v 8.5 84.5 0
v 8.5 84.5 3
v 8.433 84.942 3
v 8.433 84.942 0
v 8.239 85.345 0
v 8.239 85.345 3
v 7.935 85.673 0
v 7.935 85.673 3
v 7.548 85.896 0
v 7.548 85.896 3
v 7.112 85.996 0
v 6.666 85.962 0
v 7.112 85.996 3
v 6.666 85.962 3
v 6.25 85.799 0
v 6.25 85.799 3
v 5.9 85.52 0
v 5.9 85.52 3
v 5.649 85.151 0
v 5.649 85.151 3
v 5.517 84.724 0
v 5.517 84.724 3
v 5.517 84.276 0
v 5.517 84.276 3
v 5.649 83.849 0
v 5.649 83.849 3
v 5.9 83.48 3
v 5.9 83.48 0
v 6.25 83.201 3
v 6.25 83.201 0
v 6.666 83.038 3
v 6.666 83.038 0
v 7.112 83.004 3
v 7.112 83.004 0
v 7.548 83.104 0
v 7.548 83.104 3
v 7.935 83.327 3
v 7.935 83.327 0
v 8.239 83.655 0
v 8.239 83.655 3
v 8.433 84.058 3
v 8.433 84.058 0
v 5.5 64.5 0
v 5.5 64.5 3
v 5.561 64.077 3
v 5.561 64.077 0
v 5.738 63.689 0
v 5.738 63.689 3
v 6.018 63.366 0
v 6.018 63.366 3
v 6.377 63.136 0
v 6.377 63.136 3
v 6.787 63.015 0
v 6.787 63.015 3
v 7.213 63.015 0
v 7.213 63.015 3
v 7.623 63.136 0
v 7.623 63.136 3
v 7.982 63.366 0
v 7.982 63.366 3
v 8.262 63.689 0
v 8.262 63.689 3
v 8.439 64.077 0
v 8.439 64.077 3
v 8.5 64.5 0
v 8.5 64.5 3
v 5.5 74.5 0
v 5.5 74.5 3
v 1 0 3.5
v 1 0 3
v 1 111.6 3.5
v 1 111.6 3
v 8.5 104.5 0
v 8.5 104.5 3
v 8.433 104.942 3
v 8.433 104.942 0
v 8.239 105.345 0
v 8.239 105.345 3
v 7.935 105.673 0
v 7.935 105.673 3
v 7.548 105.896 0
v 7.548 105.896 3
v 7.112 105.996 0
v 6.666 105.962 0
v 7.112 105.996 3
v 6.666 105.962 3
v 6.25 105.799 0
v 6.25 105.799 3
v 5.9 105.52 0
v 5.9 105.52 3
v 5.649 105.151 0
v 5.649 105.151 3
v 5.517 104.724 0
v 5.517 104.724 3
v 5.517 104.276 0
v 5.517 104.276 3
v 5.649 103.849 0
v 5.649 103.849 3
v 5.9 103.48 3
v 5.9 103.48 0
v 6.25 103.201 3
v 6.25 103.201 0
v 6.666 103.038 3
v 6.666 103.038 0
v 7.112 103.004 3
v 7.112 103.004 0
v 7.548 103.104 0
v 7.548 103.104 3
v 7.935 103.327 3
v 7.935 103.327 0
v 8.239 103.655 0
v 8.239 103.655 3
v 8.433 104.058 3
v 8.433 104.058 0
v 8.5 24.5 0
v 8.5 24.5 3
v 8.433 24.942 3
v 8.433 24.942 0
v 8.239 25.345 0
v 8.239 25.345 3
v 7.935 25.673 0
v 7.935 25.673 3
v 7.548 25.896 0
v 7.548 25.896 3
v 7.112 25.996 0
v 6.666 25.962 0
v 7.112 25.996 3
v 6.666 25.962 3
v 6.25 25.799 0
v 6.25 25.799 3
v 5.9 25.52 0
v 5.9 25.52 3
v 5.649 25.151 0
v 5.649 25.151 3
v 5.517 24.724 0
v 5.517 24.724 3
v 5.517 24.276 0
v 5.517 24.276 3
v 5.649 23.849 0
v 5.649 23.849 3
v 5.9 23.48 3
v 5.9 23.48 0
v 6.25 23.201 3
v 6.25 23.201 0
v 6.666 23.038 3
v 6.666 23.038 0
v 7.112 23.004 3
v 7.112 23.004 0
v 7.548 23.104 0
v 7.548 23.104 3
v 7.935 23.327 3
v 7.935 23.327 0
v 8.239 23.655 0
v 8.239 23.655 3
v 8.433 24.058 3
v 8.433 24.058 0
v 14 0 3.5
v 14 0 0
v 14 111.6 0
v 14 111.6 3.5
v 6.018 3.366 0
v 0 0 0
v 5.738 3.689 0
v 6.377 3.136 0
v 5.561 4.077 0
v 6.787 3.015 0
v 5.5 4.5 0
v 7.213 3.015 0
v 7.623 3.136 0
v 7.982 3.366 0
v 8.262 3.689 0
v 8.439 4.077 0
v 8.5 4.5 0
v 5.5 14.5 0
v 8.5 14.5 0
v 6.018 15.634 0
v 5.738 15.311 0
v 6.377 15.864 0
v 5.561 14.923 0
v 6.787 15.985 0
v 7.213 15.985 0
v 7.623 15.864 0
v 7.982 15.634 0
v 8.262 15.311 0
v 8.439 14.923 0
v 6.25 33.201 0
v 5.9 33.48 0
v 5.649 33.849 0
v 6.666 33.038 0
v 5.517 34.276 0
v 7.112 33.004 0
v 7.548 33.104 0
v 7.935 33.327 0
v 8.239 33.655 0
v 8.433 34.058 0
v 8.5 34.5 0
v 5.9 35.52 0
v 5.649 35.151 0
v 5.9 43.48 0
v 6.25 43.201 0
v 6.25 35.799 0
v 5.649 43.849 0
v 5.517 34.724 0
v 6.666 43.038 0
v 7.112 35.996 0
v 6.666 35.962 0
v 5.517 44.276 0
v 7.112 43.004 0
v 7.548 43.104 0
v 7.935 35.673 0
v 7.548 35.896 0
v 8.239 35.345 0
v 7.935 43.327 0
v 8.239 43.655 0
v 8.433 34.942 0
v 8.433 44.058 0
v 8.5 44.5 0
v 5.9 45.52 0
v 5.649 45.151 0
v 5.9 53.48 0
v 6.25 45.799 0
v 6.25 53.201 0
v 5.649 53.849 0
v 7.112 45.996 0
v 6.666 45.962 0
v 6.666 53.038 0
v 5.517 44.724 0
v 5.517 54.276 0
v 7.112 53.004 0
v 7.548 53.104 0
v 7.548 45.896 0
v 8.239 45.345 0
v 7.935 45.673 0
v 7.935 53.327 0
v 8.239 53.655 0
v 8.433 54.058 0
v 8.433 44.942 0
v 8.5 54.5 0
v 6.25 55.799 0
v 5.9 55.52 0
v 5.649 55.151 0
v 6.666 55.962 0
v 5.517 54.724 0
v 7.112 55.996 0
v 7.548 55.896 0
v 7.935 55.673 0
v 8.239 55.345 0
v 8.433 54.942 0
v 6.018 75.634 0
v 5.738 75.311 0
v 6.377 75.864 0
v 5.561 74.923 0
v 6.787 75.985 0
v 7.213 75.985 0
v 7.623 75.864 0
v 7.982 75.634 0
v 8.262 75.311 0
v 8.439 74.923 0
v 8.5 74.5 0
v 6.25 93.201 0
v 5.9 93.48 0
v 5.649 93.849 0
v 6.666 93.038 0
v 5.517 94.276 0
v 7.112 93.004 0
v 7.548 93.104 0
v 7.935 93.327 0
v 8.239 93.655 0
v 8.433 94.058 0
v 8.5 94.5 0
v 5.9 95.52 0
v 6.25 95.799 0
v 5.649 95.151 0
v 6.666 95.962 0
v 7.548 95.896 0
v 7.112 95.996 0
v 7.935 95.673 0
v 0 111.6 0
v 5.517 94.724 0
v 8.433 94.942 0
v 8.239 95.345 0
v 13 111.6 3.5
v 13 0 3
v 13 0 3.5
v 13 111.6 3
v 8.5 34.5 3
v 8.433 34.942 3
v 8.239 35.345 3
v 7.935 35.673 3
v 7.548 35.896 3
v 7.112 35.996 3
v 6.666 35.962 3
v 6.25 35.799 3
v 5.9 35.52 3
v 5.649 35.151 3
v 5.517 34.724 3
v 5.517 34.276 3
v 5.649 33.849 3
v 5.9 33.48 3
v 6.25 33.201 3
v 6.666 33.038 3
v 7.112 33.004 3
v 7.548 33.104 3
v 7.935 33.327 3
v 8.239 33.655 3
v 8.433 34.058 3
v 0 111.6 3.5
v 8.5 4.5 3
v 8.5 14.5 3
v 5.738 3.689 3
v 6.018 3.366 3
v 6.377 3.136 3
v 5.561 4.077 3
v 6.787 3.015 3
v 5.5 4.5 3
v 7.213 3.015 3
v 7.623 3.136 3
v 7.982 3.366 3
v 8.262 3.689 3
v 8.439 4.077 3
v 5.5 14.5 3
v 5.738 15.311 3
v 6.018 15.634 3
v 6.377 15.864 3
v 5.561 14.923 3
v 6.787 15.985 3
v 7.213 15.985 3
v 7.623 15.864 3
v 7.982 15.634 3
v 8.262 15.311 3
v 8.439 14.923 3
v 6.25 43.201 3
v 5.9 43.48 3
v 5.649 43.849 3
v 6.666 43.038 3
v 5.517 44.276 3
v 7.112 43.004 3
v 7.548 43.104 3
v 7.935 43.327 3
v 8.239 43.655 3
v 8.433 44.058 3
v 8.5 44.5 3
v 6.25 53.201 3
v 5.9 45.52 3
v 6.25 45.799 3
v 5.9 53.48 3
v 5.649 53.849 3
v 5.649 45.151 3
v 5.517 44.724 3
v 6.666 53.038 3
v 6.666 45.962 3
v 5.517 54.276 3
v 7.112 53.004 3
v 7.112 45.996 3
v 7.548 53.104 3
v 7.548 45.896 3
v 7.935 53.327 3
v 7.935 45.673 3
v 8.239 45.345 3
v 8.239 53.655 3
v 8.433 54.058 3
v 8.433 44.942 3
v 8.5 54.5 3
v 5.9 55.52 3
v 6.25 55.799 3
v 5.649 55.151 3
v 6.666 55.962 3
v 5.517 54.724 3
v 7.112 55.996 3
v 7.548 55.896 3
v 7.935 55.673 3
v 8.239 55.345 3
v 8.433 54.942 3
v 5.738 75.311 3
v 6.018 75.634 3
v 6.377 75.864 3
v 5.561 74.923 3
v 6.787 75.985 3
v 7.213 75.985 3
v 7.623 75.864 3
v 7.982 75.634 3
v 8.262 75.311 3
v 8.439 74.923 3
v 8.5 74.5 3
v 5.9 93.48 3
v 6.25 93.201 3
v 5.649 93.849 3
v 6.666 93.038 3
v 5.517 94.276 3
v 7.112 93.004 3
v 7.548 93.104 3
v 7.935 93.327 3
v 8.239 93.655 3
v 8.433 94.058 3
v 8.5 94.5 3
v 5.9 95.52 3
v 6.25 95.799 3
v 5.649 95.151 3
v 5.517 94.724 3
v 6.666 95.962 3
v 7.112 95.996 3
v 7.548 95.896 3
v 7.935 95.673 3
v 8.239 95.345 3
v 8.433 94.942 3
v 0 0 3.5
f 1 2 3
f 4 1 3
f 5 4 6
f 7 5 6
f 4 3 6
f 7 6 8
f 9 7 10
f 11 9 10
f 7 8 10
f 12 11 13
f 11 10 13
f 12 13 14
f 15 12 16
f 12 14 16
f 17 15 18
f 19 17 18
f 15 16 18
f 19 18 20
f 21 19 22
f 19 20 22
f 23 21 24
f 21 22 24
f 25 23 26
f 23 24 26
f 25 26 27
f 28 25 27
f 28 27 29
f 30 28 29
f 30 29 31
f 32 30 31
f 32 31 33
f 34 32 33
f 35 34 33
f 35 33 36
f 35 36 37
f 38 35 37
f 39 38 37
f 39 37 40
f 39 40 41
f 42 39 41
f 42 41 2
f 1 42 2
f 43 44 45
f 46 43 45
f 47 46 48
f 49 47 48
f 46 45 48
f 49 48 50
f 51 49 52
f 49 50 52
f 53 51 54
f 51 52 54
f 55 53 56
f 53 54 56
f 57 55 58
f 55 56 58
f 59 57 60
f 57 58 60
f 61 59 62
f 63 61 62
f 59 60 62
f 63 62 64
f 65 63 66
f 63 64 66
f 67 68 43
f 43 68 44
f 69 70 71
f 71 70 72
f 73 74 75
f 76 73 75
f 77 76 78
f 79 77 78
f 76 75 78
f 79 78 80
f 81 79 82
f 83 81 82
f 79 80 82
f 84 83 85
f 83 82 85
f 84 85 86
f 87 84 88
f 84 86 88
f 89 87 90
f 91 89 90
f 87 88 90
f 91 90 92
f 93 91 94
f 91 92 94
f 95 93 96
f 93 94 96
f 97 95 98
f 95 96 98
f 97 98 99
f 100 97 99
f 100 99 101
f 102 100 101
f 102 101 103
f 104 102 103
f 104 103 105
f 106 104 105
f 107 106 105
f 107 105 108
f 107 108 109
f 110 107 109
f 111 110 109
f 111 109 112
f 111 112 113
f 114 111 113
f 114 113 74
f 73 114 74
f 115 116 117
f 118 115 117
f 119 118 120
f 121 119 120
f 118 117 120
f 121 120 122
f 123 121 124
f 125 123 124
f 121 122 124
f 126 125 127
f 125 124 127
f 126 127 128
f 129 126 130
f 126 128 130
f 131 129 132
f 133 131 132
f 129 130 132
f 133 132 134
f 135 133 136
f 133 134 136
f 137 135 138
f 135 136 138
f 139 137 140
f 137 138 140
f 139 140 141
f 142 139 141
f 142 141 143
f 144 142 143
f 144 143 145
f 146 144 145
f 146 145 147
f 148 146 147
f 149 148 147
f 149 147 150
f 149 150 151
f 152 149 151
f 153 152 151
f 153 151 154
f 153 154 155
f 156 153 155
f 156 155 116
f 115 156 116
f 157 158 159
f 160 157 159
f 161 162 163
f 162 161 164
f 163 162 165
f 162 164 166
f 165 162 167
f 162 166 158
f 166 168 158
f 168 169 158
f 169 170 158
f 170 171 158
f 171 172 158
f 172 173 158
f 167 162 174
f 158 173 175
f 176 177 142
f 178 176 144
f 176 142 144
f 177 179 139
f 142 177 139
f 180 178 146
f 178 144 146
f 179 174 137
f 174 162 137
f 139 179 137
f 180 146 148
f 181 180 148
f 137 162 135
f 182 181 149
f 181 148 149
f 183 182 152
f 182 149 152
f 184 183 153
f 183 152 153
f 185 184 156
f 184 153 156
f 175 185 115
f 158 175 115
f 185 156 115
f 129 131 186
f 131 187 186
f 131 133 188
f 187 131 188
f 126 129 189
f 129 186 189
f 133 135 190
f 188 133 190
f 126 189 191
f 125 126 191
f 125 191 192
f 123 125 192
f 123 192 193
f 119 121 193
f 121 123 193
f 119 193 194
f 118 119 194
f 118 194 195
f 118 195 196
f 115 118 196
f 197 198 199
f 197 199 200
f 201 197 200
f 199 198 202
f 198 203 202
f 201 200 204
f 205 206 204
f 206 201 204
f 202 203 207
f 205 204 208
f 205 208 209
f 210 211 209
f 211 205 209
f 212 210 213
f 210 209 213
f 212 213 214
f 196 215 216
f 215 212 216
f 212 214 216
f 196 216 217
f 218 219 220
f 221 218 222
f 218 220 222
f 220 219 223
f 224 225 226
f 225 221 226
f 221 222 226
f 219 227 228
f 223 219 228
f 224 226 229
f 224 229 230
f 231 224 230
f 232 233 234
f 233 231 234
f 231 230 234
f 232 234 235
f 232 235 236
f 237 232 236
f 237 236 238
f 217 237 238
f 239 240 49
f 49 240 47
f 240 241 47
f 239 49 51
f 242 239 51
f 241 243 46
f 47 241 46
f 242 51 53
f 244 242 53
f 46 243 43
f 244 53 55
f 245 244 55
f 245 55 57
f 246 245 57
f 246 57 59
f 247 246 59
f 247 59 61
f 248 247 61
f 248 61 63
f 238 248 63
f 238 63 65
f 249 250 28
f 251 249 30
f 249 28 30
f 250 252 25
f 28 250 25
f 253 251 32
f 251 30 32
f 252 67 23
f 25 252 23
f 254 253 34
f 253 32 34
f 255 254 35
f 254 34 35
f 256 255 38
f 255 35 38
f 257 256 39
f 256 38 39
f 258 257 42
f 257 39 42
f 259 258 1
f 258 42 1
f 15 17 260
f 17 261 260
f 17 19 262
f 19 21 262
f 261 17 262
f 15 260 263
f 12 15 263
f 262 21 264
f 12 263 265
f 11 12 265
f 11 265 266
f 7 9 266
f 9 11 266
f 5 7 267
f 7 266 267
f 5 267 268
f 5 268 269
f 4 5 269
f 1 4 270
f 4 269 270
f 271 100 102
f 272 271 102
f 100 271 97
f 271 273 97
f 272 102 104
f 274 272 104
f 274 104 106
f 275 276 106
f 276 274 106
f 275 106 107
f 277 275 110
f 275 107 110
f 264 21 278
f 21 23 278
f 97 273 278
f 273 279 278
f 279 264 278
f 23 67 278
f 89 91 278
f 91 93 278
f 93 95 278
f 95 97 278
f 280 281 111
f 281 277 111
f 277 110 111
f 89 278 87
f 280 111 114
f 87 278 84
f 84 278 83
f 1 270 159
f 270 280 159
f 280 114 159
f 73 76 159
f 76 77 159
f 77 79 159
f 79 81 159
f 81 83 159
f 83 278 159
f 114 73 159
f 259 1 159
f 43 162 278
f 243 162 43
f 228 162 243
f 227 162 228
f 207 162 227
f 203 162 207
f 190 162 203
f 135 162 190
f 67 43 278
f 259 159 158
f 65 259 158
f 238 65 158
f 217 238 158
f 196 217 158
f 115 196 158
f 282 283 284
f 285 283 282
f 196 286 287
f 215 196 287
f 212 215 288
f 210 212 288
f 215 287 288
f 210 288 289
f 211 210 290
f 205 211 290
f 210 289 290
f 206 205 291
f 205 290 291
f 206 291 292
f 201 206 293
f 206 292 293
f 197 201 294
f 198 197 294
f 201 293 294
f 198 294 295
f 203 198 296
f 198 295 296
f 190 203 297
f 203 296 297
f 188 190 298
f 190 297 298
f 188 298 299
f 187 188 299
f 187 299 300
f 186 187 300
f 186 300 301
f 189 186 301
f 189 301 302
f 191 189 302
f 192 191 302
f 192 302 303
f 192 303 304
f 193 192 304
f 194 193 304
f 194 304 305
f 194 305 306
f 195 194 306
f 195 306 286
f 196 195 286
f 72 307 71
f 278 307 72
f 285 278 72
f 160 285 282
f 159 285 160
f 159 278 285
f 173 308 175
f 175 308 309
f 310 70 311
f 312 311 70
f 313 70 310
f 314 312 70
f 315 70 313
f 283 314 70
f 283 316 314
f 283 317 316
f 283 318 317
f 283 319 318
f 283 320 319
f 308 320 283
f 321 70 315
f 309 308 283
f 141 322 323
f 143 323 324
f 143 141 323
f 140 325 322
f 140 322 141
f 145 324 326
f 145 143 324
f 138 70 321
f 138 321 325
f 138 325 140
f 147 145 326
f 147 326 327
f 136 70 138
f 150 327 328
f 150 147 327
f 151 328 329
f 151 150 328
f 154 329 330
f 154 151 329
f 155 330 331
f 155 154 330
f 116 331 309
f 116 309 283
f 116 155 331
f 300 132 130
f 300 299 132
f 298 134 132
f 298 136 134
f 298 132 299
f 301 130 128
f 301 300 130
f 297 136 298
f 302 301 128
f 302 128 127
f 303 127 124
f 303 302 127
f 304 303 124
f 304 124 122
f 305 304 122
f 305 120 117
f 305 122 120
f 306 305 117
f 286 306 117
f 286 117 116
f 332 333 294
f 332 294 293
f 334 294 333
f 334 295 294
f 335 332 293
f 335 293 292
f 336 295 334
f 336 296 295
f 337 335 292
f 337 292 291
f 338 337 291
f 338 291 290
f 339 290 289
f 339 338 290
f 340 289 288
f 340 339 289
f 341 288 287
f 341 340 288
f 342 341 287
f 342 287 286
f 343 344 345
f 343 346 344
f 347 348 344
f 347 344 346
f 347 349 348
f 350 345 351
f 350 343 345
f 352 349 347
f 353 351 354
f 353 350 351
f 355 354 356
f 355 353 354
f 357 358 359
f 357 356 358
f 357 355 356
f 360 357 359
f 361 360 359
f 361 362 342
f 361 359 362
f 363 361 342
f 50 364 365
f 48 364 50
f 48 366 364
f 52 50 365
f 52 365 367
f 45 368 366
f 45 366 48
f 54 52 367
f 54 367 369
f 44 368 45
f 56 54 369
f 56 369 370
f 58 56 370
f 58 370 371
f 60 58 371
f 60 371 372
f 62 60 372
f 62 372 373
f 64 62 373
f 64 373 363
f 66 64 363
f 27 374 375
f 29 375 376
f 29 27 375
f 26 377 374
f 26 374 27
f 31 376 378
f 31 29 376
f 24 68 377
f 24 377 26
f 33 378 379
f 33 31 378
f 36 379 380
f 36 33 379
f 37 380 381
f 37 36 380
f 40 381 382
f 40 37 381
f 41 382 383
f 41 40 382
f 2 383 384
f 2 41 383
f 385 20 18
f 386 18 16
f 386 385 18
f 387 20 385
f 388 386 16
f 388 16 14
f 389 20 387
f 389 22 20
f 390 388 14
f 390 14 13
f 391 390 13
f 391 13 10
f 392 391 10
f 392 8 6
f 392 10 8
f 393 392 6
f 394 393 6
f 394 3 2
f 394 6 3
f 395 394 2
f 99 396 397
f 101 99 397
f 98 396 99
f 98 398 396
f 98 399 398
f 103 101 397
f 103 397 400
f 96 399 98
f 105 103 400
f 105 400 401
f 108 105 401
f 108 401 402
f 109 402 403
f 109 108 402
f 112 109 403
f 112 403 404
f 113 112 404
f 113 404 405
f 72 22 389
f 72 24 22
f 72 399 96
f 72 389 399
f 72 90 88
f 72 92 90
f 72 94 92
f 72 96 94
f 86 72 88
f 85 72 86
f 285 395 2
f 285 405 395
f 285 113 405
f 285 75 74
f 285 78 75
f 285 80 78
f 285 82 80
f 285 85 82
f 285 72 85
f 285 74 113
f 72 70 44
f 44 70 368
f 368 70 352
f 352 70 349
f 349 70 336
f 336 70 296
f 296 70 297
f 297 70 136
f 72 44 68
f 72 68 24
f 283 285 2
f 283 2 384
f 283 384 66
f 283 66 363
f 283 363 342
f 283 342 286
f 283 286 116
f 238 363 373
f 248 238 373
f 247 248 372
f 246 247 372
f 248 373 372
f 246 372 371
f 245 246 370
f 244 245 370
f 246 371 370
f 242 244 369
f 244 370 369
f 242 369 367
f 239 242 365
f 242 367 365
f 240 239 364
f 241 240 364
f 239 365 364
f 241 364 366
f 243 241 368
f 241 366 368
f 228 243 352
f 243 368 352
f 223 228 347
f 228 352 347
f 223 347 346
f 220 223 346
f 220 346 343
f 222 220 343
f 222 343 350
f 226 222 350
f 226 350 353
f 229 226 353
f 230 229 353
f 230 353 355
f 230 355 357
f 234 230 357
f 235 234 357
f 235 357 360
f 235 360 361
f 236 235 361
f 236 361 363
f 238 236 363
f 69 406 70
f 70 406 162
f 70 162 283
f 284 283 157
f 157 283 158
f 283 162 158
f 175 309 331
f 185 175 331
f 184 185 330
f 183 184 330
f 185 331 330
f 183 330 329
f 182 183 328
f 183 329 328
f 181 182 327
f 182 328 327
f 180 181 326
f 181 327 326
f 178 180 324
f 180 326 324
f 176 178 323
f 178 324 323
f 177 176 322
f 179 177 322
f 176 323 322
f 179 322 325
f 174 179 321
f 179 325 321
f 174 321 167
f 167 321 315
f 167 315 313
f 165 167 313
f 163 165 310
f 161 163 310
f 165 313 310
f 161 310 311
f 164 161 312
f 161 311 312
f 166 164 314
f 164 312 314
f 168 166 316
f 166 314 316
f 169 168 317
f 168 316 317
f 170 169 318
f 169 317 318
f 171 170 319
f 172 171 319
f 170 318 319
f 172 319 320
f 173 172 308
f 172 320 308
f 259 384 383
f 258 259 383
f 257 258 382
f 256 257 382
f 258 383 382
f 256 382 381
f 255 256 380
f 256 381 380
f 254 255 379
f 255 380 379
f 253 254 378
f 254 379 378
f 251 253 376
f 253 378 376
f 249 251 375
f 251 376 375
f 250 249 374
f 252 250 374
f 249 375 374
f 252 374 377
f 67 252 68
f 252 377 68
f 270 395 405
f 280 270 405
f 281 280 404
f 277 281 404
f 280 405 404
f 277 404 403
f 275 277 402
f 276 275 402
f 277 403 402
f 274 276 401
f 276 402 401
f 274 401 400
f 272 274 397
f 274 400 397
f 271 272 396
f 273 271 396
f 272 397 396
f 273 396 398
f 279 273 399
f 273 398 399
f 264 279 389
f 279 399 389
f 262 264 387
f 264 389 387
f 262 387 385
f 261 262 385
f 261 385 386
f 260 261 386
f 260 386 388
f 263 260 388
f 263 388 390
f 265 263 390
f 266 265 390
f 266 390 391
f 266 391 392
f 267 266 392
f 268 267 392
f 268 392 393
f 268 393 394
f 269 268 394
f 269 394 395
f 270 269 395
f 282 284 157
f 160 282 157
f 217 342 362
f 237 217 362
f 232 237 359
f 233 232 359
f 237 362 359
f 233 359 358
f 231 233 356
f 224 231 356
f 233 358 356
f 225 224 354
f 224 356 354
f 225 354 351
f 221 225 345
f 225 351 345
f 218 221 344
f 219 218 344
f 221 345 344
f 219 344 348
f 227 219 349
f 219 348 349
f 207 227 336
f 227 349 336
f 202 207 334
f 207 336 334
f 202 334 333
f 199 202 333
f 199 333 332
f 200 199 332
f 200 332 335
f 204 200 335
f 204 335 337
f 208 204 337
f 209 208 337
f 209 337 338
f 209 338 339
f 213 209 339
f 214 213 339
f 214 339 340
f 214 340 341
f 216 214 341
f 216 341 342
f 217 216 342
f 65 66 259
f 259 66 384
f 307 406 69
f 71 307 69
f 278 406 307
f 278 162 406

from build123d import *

# Parameters (mm, degrees)
F0_W     = 14
F0_H     = 111.6
F1_DEPTH = 3
F2_W     = 1
F2_H     = 111.6
F3_DEPTH = 0.5
F4_R     = 1.5
F5_DEPTH = 25


with BuildPart() as f1:
    # F0 (on Top) → F1 (new body)
    with BuildSketch(Plane.XY):
        with Locations((7, 55.8)):
            Rectangle(F0_W, F0_H)
    extrude(amount=F1_DEPTH)

    # F2 (on face) → F3 (join)
    with BuildSketch(Plane.XY.offset(3)):
        with Locations((0.5, 55.8)):
            Rectangle(F2_W, F2_H)
        with Locations((13.5, 55.8)):
            Rectangle(F2_W, F2_H)
    extrude(amount=F3_DEPTH)

    # F4 (on face) → F5 (cut)
    with BuildSketch(Plane.XY.offset(3)):
        with BuildLine():
            Line((5.5, 14.5), (5.5, 4.5))
            ThreePointArc((5.5, 4.5), (7, 3), (8.5, 4.5))
            Line((8.5, 4.5), (8.5, 14.5))
            ThreePointArc((8.5, 14.5), (7, 16), (5.5, 14.5))
        make_face()
        with Locations((7, 24.5)):
            Circle(F4_R)
        with Locations((7, 34.5)):
            Circle(F4_R)
        with Locations((7, 44.5)):
            Circle(F4_R)
        with Locations((7, 54.5)):
            Circle(F4_R)
        with BuildLine():
            Line((5.5, 74.5), (5.5, 64.5))
            ThreePointArc((5.5, 64.5), (7, 63), (8.5, 64.5))
            Line((8.5, 64.5), (8.5, 74.5))
            ThreePointArc((8.5, 74.5), (7, 76), (5.5, 74.5))
        make_face()
        with Locations((7, 84.5)):
            Circle(F4_R)
        with Locations((7, 94.5)):
            Circle(F4_R)
        with Locations((7, 104.5)):
            Circle(F4_R)
    extrude(amount=-F5_DEPTH, mode=Mode.SUBTRACT)


solid = f1.part
